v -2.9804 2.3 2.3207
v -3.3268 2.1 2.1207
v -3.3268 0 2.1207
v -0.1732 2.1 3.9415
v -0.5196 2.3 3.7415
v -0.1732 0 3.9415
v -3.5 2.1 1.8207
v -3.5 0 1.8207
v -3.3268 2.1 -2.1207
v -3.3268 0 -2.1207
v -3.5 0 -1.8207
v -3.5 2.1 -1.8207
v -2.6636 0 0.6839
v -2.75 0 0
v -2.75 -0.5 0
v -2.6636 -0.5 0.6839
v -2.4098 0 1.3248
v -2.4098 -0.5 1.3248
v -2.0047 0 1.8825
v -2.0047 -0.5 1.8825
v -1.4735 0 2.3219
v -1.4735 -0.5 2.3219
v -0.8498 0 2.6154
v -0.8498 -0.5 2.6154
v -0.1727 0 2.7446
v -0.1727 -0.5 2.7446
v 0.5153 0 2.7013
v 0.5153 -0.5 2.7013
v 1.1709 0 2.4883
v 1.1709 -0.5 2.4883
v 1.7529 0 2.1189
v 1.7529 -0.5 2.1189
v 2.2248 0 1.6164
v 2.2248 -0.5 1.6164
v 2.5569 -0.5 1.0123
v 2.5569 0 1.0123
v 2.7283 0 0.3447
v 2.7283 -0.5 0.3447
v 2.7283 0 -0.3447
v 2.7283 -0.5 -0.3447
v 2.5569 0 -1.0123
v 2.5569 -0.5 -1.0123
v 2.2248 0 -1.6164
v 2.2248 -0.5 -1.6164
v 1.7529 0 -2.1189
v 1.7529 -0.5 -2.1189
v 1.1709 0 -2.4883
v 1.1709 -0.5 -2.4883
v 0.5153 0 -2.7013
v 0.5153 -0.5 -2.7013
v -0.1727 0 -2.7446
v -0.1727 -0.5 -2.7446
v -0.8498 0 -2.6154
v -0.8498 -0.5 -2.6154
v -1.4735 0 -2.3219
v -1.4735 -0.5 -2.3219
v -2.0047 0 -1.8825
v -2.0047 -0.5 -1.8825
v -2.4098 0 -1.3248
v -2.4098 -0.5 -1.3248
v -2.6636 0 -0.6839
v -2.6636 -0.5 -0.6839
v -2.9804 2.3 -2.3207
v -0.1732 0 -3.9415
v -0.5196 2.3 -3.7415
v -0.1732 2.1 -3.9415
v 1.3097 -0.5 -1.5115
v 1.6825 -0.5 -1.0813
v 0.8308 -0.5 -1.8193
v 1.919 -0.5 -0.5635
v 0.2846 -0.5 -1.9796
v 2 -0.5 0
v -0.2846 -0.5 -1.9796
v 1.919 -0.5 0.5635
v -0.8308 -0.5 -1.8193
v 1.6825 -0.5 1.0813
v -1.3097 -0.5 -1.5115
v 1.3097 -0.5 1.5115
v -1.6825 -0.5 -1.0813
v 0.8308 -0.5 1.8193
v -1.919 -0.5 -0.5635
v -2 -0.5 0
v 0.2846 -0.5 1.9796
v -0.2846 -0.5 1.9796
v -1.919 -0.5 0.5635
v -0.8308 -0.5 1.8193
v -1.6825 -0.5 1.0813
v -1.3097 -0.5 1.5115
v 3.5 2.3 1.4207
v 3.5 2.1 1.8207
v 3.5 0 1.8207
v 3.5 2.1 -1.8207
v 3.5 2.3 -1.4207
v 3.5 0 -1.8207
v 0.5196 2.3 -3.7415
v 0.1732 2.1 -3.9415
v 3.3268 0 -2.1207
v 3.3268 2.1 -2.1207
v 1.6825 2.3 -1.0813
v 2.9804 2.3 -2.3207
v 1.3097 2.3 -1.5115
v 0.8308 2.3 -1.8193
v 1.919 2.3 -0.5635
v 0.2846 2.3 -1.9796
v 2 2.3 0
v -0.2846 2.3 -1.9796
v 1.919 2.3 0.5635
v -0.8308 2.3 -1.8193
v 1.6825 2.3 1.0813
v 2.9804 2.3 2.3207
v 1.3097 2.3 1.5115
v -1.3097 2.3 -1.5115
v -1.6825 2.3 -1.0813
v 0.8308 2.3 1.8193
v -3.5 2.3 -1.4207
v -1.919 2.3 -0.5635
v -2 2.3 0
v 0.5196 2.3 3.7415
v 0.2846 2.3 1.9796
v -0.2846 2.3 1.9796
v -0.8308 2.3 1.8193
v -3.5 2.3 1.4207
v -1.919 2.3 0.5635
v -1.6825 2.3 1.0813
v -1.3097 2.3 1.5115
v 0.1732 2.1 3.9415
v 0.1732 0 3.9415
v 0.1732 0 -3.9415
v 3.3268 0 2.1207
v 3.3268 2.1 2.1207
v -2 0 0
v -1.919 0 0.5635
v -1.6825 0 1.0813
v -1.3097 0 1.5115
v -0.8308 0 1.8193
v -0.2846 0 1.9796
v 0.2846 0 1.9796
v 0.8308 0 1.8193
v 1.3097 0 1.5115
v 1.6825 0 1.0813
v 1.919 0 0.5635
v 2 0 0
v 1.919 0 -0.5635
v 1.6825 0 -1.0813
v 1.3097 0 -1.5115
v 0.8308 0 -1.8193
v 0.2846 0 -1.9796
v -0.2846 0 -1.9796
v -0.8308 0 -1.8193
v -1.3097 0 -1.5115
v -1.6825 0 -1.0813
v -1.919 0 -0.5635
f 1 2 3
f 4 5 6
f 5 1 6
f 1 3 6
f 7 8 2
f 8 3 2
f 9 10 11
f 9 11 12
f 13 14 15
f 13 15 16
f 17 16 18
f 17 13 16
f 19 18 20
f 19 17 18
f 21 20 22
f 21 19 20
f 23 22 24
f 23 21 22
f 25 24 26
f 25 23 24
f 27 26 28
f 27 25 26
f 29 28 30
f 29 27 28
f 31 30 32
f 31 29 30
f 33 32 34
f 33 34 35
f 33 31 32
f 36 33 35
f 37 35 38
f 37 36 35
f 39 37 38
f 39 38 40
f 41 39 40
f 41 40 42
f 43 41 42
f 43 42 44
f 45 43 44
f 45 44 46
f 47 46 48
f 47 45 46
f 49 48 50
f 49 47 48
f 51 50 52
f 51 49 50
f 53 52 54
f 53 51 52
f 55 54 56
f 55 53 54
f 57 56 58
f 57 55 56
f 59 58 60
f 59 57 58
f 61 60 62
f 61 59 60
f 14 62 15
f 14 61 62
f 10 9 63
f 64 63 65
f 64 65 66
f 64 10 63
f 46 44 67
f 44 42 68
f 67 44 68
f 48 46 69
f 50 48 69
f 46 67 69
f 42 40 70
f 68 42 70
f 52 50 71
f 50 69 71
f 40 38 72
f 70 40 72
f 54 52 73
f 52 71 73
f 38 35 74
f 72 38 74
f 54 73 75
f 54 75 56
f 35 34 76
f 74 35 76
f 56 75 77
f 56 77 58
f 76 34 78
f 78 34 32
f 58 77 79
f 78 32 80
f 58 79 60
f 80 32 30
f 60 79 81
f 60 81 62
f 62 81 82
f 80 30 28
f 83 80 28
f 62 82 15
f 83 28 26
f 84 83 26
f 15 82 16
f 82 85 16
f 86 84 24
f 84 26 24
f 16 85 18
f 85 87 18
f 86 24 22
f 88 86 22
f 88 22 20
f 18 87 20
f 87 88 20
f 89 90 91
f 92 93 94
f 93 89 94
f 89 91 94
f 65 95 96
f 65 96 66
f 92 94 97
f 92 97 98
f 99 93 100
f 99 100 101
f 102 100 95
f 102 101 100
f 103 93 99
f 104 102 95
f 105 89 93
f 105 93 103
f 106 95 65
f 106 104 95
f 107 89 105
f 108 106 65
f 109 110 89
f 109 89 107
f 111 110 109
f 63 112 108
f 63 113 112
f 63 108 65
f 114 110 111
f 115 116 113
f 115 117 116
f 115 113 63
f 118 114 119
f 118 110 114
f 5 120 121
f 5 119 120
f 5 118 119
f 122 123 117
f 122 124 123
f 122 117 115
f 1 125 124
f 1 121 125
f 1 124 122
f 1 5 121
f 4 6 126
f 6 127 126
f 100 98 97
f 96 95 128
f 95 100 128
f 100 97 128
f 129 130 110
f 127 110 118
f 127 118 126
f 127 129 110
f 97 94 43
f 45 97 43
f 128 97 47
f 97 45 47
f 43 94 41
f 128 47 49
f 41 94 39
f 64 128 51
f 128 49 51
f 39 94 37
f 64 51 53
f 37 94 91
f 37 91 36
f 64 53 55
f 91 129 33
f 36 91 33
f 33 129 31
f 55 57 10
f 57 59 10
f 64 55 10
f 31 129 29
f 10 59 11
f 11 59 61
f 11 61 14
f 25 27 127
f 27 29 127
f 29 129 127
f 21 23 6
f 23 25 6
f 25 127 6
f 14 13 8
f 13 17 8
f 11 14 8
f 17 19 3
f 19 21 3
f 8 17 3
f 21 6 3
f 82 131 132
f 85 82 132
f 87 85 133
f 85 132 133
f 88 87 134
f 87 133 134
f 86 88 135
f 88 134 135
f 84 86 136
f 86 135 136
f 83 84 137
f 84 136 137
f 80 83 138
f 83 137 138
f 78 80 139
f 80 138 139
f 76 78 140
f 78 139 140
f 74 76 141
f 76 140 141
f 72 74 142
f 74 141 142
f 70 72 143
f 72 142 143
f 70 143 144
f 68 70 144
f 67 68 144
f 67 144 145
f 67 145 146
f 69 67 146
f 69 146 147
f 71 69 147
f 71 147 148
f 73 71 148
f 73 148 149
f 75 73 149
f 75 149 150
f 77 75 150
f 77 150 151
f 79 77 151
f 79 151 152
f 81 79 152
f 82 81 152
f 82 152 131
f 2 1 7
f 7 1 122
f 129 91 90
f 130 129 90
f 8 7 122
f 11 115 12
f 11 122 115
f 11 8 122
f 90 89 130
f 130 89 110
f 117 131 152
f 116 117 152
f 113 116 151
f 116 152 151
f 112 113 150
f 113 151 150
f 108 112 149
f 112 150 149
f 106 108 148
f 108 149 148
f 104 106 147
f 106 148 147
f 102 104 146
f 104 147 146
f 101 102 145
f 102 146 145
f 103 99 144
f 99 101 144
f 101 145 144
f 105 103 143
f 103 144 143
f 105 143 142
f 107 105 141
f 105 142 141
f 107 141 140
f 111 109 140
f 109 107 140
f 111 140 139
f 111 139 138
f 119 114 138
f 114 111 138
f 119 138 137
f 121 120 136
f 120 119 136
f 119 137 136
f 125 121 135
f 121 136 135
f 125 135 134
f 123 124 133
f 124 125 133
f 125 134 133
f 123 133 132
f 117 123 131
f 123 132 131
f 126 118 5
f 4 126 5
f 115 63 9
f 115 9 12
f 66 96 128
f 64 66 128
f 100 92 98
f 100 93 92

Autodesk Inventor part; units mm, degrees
ref_plane "YZ Plane" through (0, 0, 0) normal (1, 0, 0) x (0, 1, 0)
ref_plane "XZ Plane" through (0, 0, 0) normal (0, 1, 0) x (-1, 0, 0)
ref_plane "XY Plane" through (0, 0, 0) normal (0, 0, 1) x (1, 0, 0)
sketch "スケッチ2" plane through (0, 0, 0) normal (0, 1, 0) x (-1, 0, 0)
  circle A0 centre (0, 0) radius 2
  circle A1 centre (0, 0) radius 2.75
  circle A2 centre (0, 0) radius 3.5
  line L0 (3.2709, 0) -> (-4.3069, 0) construction
  line L1 (-3.5, -2.0207) -> (0, -4.0415)
  line L2 (-3.5, 0) -> (-3.5, -2.0207)
  line L3 (0, 3.4516) -> (0, -4.8702) construction
  line L4 (-3.5, 2.0207) -> (0, 4.0415)
  line L5 (-3.5, 0) -> (-3.5, 2.0207)
  line L6 (3.5, -2.0207) -> (0, -4.0415)
  line L7 (3.5, 0) -> (3.5, -2.0207)
  line L8 (3.5, 2.0207) -> (0, 4.0415)
  line L9 (3.5, 0) -> (3.5, 2.0207)
  dimension "d8" = 7
  dimension "d6" = 4
  dimension "d7" = 5.5
  dimension "d25" = 120
extrude "押し出し1" add sketch "スケッチ2" against normal blind 0.5 contours A1
extrude "押し出し2" add sketch "スケッチ2" along normal blind 2.3 contours A1 | A2 | L7 L6 A2 | A2 L8 L9 | A2 L4 L8 | L6 L1 A2 | A2 L5 L4 | L1 L2 A2
chamfer "面取り1" distance 0.2 angle 45 6 edges at (3.5, 1.15, -2.0207) (0, 1.15, -4.0415) (-3.5, 1.15, -2.0207) (-3.5, 1.15, 2.0207) (0, 1.15, 4.0415) (3.5, 1.15, 2.0207)
chamfer "面取り2" distance 0.2 angle 45 6 edges at (3.4134, 2.3, -1.9707) (0, 2.3, -3.9415) (-3.4134, 2.3, -1.9707) (-3.4134, 2.3, 1.9707) (0, 2.3, 3.9415) (3.4134, 2.3, 1.9707)
thread "ねじ1" size "M4x0.7" class "6H" standard "ANSI Metric M Profile" full length
properties part number "S4-05-3W" material "ステンレス鋼 AISI 304"
